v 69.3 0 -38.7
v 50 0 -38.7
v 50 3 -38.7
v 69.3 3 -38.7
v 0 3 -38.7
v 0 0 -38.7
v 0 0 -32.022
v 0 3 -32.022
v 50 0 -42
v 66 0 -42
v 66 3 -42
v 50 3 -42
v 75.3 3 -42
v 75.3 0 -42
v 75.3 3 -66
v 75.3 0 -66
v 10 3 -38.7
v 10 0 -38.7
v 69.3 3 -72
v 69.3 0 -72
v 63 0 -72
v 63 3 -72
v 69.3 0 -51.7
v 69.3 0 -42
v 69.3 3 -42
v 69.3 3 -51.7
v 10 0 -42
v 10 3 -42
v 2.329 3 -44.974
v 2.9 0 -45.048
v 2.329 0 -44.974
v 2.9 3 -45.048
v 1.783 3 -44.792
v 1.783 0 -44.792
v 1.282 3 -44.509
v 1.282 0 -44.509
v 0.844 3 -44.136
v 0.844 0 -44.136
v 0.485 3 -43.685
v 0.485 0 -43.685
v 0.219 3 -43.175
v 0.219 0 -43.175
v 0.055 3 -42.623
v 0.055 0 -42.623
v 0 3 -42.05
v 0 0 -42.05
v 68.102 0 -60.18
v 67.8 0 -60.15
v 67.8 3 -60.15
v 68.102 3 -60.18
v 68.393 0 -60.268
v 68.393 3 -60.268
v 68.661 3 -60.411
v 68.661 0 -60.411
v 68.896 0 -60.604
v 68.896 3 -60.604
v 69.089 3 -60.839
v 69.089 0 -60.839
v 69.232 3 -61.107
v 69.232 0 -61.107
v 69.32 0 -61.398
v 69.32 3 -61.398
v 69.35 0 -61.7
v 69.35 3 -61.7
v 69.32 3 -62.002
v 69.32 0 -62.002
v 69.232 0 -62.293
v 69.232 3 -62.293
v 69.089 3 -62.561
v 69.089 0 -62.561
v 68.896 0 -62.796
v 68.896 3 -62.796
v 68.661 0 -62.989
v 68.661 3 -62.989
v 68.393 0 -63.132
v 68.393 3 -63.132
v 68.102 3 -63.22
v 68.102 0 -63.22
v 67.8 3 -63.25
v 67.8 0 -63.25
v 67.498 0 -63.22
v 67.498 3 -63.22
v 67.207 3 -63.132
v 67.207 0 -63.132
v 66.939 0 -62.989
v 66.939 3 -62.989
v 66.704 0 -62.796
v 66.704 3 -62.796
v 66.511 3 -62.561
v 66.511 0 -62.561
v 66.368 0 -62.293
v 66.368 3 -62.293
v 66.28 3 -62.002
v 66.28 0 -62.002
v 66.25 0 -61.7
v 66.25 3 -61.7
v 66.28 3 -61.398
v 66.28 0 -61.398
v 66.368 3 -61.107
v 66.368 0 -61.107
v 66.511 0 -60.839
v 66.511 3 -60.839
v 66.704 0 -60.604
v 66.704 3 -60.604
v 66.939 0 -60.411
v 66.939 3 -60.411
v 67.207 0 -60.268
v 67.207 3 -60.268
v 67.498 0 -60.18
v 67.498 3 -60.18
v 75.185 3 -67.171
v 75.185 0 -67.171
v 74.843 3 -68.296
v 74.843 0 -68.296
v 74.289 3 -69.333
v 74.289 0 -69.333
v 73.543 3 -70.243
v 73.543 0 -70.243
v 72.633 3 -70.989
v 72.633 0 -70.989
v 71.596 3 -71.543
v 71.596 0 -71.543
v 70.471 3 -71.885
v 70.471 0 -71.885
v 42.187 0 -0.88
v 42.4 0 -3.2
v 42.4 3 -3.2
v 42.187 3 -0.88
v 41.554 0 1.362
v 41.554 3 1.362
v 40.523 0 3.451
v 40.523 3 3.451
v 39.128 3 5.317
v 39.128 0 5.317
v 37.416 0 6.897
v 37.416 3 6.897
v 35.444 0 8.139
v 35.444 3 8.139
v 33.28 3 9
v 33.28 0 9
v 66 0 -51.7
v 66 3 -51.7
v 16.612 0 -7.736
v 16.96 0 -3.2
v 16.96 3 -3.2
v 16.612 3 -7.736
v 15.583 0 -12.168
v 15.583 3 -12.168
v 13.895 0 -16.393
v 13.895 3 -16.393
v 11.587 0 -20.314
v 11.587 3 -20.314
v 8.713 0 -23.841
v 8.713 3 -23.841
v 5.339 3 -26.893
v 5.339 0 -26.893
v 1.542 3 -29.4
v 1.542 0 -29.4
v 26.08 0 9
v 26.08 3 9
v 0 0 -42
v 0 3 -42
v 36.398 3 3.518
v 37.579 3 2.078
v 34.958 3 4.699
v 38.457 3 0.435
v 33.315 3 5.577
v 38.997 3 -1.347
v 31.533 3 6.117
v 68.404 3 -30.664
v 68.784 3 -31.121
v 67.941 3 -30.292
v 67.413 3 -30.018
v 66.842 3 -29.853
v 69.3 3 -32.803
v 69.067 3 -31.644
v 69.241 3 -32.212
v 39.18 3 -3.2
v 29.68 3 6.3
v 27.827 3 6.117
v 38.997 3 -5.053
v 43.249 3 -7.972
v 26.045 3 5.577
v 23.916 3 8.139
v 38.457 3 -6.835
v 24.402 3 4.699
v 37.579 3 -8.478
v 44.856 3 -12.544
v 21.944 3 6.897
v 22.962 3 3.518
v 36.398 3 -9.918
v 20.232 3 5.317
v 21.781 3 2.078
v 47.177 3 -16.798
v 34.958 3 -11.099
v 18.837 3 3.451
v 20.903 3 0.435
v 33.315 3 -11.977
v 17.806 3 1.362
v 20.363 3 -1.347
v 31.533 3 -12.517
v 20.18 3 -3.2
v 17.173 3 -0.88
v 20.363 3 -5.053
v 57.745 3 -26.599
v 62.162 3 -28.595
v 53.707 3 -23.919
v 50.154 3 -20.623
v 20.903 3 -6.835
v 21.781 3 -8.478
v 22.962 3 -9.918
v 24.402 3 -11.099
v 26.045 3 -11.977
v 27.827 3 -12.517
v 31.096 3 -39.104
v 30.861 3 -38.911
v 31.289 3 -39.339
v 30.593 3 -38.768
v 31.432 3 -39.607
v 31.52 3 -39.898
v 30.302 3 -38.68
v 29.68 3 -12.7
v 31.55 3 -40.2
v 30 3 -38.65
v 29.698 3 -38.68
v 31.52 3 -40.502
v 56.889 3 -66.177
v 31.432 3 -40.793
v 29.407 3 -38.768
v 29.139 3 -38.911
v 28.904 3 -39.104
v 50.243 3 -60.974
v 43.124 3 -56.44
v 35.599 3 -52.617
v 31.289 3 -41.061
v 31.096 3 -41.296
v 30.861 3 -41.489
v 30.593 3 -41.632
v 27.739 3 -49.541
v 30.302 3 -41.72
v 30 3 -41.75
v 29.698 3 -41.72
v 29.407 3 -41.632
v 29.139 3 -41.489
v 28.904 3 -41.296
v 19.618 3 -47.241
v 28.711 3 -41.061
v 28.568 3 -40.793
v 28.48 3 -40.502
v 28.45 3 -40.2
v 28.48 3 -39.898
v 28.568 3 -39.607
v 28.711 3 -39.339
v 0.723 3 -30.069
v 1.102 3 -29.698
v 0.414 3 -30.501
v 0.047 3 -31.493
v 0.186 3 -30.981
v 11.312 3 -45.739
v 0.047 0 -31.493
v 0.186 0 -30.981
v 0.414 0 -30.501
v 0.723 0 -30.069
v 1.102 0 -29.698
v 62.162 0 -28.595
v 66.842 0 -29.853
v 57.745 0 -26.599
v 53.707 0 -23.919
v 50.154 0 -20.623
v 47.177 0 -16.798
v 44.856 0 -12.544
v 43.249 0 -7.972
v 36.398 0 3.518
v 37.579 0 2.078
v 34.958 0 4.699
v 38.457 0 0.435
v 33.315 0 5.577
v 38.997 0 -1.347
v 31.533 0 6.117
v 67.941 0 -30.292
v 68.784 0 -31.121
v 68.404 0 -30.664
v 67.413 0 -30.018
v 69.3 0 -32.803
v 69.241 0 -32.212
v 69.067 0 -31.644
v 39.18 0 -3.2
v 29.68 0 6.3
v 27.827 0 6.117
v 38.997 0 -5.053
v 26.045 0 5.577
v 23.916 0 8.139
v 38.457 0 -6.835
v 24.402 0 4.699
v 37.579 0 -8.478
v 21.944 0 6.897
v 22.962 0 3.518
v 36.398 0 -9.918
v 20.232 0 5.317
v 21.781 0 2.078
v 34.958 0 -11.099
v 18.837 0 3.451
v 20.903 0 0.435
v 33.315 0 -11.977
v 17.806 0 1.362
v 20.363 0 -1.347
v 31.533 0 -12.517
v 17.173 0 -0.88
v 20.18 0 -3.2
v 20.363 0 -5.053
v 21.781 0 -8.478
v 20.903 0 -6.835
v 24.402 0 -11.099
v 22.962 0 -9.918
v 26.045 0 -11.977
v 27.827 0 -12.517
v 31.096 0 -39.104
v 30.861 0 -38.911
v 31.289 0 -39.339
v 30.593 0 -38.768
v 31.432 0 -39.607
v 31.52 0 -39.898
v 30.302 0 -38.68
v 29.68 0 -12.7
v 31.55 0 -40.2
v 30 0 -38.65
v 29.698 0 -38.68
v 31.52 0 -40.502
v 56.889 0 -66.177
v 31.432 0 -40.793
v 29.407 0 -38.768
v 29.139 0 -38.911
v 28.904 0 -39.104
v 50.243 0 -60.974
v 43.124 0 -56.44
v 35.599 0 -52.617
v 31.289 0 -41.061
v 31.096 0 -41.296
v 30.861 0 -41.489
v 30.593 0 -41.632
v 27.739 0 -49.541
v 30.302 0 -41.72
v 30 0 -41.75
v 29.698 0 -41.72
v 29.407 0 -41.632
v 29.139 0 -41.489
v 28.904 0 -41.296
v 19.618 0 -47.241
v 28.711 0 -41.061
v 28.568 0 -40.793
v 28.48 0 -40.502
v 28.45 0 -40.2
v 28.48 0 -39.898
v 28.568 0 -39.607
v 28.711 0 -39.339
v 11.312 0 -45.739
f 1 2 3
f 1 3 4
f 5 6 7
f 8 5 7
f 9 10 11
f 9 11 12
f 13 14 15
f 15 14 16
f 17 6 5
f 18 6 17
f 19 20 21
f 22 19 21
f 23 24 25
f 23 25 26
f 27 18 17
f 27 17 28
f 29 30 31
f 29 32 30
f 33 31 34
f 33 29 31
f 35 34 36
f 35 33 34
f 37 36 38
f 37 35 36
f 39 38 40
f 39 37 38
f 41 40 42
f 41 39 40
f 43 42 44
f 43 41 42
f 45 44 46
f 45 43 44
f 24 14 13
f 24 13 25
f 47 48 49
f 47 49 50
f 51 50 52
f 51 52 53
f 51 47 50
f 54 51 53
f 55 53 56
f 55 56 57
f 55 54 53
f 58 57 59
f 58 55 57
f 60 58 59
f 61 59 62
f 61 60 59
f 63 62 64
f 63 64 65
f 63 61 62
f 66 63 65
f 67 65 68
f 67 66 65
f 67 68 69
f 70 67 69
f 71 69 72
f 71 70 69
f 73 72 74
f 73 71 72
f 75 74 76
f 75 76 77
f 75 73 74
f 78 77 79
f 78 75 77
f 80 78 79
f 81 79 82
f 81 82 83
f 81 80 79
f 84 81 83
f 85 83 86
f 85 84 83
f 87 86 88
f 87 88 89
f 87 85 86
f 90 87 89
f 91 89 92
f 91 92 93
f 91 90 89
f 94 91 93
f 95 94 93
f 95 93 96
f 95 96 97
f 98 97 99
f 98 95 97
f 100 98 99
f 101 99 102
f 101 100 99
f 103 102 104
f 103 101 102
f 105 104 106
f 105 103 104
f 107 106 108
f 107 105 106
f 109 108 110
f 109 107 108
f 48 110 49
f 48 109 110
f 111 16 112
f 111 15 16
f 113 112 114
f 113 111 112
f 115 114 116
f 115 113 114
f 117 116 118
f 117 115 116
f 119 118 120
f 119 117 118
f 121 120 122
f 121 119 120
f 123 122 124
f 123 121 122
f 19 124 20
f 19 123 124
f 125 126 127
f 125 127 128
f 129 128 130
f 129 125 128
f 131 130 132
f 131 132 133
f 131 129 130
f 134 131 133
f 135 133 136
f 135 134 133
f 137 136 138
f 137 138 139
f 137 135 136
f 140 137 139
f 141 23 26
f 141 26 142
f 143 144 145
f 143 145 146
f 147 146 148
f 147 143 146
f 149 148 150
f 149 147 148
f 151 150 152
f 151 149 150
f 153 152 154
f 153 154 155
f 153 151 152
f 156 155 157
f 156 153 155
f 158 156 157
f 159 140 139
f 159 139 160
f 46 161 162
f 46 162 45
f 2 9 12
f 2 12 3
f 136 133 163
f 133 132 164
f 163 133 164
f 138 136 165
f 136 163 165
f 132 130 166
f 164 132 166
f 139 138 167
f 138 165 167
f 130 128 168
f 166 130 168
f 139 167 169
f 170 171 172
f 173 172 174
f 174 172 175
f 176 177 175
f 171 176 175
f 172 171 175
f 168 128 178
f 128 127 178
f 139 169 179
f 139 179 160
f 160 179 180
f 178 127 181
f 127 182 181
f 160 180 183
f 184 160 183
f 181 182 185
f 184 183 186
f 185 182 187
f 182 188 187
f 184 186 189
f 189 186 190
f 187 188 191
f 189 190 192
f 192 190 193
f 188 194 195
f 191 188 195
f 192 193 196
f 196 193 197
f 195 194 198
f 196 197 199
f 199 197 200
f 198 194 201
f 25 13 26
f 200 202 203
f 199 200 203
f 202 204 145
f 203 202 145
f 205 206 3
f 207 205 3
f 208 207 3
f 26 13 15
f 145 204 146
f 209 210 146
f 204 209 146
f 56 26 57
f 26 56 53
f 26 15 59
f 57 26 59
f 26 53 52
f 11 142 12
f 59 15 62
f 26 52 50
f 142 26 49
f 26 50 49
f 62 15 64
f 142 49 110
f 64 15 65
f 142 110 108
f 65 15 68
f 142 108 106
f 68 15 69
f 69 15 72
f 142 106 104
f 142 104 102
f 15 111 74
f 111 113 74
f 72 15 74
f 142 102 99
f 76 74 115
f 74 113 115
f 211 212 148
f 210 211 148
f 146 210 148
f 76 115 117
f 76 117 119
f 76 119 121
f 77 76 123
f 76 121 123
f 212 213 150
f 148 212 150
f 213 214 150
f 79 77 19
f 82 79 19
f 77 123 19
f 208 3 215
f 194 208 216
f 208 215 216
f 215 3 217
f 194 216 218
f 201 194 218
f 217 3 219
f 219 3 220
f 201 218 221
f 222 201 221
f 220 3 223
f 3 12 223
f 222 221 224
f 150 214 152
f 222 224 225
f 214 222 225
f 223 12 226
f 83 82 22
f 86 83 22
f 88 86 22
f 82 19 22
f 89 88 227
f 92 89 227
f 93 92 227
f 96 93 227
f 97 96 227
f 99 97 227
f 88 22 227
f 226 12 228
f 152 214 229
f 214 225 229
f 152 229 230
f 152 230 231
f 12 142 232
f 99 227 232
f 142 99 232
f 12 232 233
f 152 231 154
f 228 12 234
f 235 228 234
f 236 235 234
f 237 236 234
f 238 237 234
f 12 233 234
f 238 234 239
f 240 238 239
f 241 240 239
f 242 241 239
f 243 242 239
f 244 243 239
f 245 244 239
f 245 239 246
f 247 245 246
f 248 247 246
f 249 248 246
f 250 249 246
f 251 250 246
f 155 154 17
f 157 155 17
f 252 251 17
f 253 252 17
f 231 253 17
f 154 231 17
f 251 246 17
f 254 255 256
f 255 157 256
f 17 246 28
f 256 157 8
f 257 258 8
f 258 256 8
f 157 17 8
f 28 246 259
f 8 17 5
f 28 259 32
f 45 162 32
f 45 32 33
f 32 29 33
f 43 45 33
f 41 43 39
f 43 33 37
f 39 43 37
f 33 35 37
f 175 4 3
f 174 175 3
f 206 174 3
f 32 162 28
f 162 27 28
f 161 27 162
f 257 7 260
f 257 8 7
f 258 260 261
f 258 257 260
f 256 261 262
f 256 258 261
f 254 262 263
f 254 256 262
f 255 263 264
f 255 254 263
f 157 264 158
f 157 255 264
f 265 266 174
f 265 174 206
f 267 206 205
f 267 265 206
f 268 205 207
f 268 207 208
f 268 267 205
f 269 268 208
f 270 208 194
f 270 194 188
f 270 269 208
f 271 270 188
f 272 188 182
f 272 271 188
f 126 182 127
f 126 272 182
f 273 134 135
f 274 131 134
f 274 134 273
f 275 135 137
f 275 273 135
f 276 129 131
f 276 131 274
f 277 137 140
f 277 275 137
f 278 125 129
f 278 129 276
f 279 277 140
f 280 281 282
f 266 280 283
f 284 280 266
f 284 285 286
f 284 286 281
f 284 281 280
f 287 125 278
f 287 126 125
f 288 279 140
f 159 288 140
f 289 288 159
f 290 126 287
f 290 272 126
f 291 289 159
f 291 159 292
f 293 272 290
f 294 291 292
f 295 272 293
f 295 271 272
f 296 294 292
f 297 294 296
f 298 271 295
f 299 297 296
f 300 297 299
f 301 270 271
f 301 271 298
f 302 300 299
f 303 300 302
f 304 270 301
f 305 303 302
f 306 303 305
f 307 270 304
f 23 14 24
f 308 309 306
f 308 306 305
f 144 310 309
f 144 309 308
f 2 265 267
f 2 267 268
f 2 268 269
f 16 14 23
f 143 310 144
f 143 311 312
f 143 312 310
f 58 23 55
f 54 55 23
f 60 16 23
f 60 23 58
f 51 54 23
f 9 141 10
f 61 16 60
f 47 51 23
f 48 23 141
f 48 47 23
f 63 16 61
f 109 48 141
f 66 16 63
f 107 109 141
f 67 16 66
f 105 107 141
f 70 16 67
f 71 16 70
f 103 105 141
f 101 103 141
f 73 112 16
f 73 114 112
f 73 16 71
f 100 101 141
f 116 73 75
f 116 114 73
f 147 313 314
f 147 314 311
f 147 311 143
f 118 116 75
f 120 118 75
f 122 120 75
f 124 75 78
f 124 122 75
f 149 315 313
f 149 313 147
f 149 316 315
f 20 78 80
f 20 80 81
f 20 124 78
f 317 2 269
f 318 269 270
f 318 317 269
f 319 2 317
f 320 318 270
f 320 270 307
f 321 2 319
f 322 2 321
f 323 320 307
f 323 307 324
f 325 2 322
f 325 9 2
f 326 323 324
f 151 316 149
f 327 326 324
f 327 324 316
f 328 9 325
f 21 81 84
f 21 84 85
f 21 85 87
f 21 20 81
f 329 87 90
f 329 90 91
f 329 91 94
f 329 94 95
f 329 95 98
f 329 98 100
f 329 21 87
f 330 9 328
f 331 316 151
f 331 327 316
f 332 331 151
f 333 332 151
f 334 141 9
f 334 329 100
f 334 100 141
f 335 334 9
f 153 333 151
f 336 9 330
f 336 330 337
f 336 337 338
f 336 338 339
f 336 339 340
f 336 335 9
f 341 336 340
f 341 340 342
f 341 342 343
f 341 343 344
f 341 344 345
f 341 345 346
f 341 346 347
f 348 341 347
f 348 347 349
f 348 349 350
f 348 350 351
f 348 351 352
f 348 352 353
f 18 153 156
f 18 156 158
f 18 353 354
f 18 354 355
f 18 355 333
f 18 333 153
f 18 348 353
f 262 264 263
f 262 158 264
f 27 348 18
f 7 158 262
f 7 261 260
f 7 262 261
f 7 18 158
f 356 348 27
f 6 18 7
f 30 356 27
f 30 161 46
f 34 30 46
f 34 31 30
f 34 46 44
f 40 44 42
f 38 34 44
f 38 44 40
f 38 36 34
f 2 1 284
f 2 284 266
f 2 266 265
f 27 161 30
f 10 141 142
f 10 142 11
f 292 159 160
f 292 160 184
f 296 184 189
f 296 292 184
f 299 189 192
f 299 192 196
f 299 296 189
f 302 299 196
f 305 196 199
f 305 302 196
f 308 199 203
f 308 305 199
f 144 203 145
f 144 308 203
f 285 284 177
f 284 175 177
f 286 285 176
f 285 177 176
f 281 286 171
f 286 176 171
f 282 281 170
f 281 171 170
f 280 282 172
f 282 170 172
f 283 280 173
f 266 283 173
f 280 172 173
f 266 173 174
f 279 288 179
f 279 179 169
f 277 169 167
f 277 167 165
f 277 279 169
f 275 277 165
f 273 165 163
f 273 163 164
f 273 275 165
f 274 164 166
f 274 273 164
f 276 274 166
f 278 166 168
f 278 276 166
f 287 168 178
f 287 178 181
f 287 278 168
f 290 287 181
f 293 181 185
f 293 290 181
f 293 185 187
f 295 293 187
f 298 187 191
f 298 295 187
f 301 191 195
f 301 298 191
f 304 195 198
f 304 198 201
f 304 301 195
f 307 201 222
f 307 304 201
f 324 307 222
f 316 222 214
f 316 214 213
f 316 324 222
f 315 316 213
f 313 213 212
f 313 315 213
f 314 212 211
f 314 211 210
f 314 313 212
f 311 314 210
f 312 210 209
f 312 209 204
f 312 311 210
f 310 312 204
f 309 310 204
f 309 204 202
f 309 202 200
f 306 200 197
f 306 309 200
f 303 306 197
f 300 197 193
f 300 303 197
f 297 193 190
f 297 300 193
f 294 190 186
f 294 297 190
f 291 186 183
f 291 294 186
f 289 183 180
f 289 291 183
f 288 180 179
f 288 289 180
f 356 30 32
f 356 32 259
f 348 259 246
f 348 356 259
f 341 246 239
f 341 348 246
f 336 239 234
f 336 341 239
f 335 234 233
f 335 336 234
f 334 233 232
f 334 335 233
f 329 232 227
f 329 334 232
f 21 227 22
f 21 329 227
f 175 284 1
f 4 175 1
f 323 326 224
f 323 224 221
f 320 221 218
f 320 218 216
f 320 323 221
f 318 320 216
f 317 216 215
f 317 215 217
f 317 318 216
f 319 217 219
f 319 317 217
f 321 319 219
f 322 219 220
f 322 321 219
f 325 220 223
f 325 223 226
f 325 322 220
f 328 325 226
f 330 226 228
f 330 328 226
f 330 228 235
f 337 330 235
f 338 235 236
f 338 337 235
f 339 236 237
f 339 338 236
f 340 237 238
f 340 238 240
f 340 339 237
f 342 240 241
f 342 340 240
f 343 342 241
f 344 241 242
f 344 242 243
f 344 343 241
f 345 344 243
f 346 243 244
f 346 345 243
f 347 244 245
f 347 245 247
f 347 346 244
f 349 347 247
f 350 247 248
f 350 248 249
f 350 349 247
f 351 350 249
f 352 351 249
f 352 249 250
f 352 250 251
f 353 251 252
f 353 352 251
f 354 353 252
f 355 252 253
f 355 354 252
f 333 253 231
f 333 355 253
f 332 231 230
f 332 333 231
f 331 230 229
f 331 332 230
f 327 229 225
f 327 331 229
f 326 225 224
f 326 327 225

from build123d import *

# Parameters (mm, degrees)
CROQUIS1_R               = 1.55
CROQUIS1_R_2             = 9.5
SALIENTE_EXTRUIR10_DEPTH = 3
CORTAR_EXTRUIR2_START    = -3
CORTAR_EXTRUIR2_DEPTH    = 3
REDONDEO1_R              = 6
REDONDEO2_R              = 3


# Read off the part's stored shape, not the designer's step: Cortar-Extruir2
with BuildPart() as part:
    # Croquis1 → Saliente-Extruir10 (new body)
    with BuildSketch(Plane(origin=(0, 0, 0), x_dir=(1, 0, 0), z_dir=(0, 1, 0))):
        Polygon((0, 0), (0, 38.7), (10, 38.7), (10, 42), (0, 42), (0, 72), (69.3, 72), (75.3, 72), (75.3, 52), (75.3, 42), (69.3, 42), (69.3, 51.7), (66, 51.7), (66, 42), (50, 42), (50, 38.7), (69.3, 38.7), (69.3, 0), (69.3, -9), (0, -9), align=None)
        with Locations(Location((30, 40.2, 0), (0, 0, 270))):
            Circle(CROQUIS1_R, mode=Mode.SUBTRACT)
        with Locations(Location((67.8, 61.7, 0), (0, 0, 270))):
            Circle(CROQUIS1_R, mode=Mode.SUBTRACT)
        with Locations(Location((29.68, 3.2, 0), (0, 0, 270))):
            Circle(CROQUIS1_R_2, mode=Mode.SUBTRACT)
    extrude(amount=SALIENTE_EXTRUIR10_DEPTH)

    # Cortar-Extruir2 outline → Cortar-Extruir2 (cut)
    with BuildSketch(Plane(origin=(0, 3, 0), x_dir=(1, 0, 0), z_dir=(0, 1, 0)).offset(CORTAR_EXTRUIR2_START)):
        with BuildLine():
            ThreePointArc((26.080222229, -9), (19.492076432, -4.416075983), (16.96, 3.2))
            ThreePointArc((16.96, 3.2), (12.363945378, 19.139693097), (0, 30.2))
            Line((0, 30.2), (0, -9))
            Line((0, -9), (26.080222229, -9))
        make_face()
        with BuildLine():
            ThreePointArc((42.4, 3.2), (39.867923568, -4.416075983), (33.279777771, -9))
            Line((33.279777771, -9), (69.3, -9))
            Line((69.3, -9), (69.3, 30.2))
            ThreePointArc((69.3, 30.2), (51.011487425, 21.520592158), (42.4, 3.2))
        make_face()
        with BuildLine():
            Line((0, 72), (0, 45))
            ThreePointArc((0, 45), (34.270978976, 52.034382388), (63, 72))
            Line((63, 72), (0, 72))
        make_face()
    extrude(amount=CORTAR_EXTRUIR2_DEPTH, mode=Mode.SUBTRACT)

    # Redondeo1
    redondeo1_edges = [part.edges().sort_by_distance(p)[0] for p in [
        (75.3, 1.5, -72),
    ]]
    fillet(redondeo1_edges, radius=REDONDEO1_R)

    # Redondeo2
    redondeo2_edges = [part.edges().sort_by_distance(p)[0] for p in [
        (69.3, 1.5, -30.2),
        (0, 1.5, -45),
        (0, 1.5, -30.2),
    ]]
    fillet(redondeo2_edges, radius=REDONDEO2_R)


solid = part.part
